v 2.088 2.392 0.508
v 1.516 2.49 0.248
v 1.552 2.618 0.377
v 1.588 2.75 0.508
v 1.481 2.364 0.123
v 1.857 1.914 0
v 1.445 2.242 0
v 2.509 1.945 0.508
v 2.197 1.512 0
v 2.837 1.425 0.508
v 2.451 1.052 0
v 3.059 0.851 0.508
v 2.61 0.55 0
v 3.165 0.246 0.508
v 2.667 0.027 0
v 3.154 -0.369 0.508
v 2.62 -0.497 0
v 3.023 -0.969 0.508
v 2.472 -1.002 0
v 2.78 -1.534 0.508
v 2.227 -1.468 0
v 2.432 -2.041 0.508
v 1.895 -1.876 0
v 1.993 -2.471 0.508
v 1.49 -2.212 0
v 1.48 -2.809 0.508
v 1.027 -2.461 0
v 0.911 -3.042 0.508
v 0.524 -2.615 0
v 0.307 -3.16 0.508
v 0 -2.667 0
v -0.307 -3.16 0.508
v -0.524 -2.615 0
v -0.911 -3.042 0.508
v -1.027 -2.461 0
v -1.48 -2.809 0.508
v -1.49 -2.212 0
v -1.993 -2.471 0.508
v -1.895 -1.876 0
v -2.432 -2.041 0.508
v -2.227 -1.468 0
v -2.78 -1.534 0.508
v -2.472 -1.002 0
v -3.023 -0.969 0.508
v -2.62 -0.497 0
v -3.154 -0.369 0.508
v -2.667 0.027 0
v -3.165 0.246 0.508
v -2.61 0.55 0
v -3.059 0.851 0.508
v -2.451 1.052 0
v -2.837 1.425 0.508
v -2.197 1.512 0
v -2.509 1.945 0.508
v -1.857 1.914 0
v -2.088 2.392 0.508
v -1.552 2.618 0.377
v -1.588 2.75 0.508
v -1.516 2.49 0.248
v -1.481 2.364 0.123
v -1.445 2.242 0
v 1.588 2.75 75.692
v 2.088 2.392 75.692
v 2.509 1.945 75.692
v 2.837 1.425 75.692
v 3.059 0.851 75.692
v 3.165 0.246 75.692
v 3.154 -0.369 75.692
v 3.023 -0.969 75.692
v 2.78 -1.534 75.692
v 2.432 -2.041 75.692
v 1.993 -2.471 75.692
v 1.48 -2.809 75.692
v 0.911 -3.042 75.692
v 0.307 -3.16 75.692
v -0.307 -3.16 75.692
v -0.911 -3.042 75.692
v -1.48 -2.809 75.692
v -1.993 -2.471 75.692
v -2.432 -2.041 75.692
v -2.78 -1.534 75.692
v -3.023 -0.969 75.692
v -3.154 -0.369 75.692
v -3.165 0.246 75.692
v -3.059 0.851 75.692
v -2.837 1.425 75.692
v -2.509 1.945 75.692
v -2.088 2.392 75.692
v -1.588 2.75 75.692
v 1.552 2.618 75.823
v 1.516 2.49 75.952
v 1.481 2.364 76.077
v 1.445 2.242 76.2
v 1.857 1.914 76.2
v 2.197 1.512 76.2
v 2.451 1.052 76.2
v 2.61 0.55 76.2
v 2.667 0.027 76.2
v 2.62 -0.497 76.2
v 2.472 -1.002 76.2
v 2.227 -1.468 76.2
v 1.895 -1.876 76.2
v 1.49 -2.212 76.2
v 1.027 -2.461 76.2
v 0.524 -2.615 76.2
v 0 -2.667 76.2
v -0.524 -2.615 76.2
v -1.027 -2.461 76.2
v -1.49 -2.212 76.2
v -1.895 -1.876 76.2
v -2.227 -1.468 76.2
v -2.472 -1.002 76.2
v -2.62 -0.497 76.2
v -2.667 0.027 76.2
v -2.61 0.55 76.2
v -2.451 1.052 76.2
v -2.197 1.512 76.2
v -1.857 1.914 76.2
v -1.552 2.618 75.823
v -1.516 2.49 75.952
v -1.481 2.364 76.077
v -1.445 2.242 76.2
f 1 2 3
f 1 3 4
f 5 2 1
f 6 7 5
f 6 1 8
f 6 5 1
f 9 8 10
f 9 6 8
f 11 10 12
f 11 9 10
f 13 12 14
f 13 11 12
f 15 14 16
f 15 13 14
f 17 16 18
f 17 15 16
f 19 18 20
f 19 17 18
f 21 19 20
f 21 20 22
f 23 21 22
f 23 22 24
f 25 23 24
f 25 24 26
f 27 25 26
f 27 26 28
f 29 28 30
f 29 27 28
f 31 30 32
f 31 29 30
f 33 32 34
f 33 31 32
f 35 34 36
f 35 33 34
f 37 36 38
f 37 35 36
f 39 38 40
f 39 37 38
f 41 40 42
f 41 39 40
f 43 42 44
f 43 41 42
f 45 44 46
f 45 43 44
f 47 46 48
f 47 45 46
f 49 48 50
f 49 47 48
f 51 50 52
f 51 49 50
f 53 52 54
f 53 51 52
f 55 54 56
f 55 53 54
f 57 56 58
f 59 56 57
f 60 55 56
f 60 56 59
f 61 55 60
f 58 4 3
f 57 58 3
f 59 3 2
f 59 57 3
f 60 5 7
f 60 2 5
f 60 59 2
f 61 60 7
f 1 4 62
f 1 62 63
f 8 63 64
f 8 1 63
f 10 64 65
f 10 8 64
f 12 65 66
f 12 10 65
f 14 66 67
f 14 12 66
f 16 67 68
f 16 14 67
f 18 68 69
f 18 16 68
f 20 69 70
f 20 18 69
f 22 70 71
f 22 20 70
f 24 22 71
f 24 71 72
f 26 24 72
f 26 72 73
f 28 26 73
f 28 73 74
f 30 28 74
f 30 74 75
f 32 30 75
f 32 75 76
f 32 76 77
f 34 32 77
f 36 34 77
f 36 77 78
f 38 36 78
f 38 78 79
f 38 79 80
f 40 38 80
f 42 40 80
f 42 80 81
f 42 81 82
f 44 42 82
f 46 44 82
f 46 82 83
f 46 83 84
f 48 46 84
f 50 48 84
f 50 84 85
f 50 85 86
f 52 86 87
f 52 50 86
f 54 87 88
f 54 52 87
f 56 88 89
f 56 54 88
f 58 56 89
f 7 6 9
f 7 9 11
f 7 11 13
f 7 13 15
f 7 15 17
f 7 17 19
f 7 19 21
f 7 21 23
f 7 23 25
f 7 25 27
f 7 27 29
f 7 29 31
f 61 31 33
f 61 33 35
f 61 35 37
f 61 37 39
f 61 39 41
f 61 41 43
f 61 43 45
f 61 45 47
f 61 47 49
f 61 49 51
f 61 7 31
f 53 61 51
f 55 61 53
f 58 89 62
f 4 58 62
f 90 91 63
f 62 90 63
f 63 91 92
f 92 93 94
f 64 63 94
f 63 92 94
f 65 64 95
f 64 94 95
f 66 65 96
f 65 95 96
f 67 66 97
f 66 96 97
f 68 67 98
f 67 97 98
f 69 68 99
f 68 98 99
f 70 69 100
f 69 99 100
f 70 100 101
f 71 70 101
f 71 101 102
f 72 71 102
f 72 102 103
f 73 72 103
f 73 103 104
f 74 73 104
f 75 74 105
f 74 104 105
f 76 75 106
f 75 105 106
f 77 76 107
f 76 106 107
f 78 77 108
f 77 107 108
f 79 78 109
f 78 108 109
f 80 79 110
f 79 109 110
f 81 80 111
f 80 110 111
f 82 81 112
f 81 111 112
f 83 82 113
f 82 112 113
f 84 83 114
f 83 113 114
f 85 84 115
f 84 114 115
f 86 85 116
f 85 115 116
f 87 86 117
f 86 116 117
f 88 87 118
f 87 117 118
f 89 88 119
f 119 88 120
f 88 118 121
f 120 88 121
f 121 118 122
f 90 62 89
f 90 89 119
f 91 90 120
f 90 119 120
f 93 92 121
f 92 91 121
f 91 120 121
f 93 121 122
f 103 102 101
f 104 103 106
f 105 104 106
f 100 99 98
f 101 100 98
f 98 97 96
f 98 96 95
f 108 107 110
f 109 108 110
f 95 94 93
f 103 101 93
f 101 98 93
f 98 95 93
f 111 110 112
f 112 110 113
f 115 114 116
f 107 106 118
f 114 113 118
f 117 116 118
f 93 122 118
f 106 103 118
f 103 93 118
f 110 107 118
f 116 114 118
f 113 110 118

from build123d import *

# Parameters (mm, degrees)
BOSS_EXTRUDE1_DEPTH = 76.2
CHAMFER1_SIZE       = 0.508


with BuildPart() as part:
    # Sketch1 → Boss-Extrude1 (new body)
    with BuildSketch(Plane.XY):
        with BuildLine():
            Line((-1.5875, 2.749630657), (1.5875, 2.749630657))
            ThreePointArc((1.5875, 2.749630657), (0, -3.175), (-1.5875, 2.749630657))
        make_face()
    extrude(amount=BOSS_EXTRUDE1_DEPTH)

    # Chamfer1
    # the kernel refuses this chamfer: 0.508 mm, written as the material it takes off along each edge
    with BuildSketch(Plane(origin=(-2.893914958, 2.749630657, 0), x_dir=(0, 0.027495876610586435, 0.9996219169112968), z_dir=(1, 0, 0))) as chamfer1_piece_1:
        Polygon((CHAMFER1_SIZE * 0.999621916911, CHAMFER1_SIZE * 0.0274958766106), (-CHAMFER1_SIZE * 0.0274958766106, CHAMFER1_SIZE * 0.999621916911), (0, 0), align=None)
    extrude(amount=5.787829916, mode=Mode.SUBTRACT)
    with BuildSketch(Plane(origin=(0, 0, 0), x_dir=(0.11006425826792274, 0.9939244735149306, 0), z_dir=(-0.9939244735149306, 0.11006425826792274, 0))) as chamfer1_piece_2:
        Polygon((3.175, -CHAMFER1_SIZE), (3.175 - CHAMFER1_SIZE, 0), (3.175, 0), align=None)
    revolve(axis=Axis((0, 0, 0), (0, 0, -1)), revolution_arc=347.361960422, mode=Mode.SUBTRACT)
    with BuildSketch(Plane(origin=(0, 0, 76.2), x_dir=(0.11006425826792288, 0.9939244735149306, 0), z_dir=(-0.9939244735149306, 0.11006425826792288, 0))) as chamfer1_piece_3:
        Polygon((3.175, CHAMFER1_SIZE), (3.175 - CHAMFER1_SIZE, 0), (3.175, 0), align=None)
    revolve(axis=Axis((0, 0, 76.2), (0, 0, -1)), revolution_arc=347.361960422, mode=Mode.SUBTRACT)
    with BuildSketch(Plane(origin=(-2.893914958, 2.749630657, 76.2), x_dir=(0, 0.027495876610587017, -0.9996219169112968), z_dir=(1, 0, 0))) as chamfer1_piece_4:
        Polygon((CHAMFER1_SIZE * 0.999621916911, -CHAMFER1_SIZE * 0.0274958766106), (-CHAMFER1_SIZE * 0.0274958766106, -CHAMFER1_SIZE * 0.999621916911), (0, 0), align=None)
    extrude(amount=5.787829916, mode=Mode.SUBTRACT)


solid = part.part
